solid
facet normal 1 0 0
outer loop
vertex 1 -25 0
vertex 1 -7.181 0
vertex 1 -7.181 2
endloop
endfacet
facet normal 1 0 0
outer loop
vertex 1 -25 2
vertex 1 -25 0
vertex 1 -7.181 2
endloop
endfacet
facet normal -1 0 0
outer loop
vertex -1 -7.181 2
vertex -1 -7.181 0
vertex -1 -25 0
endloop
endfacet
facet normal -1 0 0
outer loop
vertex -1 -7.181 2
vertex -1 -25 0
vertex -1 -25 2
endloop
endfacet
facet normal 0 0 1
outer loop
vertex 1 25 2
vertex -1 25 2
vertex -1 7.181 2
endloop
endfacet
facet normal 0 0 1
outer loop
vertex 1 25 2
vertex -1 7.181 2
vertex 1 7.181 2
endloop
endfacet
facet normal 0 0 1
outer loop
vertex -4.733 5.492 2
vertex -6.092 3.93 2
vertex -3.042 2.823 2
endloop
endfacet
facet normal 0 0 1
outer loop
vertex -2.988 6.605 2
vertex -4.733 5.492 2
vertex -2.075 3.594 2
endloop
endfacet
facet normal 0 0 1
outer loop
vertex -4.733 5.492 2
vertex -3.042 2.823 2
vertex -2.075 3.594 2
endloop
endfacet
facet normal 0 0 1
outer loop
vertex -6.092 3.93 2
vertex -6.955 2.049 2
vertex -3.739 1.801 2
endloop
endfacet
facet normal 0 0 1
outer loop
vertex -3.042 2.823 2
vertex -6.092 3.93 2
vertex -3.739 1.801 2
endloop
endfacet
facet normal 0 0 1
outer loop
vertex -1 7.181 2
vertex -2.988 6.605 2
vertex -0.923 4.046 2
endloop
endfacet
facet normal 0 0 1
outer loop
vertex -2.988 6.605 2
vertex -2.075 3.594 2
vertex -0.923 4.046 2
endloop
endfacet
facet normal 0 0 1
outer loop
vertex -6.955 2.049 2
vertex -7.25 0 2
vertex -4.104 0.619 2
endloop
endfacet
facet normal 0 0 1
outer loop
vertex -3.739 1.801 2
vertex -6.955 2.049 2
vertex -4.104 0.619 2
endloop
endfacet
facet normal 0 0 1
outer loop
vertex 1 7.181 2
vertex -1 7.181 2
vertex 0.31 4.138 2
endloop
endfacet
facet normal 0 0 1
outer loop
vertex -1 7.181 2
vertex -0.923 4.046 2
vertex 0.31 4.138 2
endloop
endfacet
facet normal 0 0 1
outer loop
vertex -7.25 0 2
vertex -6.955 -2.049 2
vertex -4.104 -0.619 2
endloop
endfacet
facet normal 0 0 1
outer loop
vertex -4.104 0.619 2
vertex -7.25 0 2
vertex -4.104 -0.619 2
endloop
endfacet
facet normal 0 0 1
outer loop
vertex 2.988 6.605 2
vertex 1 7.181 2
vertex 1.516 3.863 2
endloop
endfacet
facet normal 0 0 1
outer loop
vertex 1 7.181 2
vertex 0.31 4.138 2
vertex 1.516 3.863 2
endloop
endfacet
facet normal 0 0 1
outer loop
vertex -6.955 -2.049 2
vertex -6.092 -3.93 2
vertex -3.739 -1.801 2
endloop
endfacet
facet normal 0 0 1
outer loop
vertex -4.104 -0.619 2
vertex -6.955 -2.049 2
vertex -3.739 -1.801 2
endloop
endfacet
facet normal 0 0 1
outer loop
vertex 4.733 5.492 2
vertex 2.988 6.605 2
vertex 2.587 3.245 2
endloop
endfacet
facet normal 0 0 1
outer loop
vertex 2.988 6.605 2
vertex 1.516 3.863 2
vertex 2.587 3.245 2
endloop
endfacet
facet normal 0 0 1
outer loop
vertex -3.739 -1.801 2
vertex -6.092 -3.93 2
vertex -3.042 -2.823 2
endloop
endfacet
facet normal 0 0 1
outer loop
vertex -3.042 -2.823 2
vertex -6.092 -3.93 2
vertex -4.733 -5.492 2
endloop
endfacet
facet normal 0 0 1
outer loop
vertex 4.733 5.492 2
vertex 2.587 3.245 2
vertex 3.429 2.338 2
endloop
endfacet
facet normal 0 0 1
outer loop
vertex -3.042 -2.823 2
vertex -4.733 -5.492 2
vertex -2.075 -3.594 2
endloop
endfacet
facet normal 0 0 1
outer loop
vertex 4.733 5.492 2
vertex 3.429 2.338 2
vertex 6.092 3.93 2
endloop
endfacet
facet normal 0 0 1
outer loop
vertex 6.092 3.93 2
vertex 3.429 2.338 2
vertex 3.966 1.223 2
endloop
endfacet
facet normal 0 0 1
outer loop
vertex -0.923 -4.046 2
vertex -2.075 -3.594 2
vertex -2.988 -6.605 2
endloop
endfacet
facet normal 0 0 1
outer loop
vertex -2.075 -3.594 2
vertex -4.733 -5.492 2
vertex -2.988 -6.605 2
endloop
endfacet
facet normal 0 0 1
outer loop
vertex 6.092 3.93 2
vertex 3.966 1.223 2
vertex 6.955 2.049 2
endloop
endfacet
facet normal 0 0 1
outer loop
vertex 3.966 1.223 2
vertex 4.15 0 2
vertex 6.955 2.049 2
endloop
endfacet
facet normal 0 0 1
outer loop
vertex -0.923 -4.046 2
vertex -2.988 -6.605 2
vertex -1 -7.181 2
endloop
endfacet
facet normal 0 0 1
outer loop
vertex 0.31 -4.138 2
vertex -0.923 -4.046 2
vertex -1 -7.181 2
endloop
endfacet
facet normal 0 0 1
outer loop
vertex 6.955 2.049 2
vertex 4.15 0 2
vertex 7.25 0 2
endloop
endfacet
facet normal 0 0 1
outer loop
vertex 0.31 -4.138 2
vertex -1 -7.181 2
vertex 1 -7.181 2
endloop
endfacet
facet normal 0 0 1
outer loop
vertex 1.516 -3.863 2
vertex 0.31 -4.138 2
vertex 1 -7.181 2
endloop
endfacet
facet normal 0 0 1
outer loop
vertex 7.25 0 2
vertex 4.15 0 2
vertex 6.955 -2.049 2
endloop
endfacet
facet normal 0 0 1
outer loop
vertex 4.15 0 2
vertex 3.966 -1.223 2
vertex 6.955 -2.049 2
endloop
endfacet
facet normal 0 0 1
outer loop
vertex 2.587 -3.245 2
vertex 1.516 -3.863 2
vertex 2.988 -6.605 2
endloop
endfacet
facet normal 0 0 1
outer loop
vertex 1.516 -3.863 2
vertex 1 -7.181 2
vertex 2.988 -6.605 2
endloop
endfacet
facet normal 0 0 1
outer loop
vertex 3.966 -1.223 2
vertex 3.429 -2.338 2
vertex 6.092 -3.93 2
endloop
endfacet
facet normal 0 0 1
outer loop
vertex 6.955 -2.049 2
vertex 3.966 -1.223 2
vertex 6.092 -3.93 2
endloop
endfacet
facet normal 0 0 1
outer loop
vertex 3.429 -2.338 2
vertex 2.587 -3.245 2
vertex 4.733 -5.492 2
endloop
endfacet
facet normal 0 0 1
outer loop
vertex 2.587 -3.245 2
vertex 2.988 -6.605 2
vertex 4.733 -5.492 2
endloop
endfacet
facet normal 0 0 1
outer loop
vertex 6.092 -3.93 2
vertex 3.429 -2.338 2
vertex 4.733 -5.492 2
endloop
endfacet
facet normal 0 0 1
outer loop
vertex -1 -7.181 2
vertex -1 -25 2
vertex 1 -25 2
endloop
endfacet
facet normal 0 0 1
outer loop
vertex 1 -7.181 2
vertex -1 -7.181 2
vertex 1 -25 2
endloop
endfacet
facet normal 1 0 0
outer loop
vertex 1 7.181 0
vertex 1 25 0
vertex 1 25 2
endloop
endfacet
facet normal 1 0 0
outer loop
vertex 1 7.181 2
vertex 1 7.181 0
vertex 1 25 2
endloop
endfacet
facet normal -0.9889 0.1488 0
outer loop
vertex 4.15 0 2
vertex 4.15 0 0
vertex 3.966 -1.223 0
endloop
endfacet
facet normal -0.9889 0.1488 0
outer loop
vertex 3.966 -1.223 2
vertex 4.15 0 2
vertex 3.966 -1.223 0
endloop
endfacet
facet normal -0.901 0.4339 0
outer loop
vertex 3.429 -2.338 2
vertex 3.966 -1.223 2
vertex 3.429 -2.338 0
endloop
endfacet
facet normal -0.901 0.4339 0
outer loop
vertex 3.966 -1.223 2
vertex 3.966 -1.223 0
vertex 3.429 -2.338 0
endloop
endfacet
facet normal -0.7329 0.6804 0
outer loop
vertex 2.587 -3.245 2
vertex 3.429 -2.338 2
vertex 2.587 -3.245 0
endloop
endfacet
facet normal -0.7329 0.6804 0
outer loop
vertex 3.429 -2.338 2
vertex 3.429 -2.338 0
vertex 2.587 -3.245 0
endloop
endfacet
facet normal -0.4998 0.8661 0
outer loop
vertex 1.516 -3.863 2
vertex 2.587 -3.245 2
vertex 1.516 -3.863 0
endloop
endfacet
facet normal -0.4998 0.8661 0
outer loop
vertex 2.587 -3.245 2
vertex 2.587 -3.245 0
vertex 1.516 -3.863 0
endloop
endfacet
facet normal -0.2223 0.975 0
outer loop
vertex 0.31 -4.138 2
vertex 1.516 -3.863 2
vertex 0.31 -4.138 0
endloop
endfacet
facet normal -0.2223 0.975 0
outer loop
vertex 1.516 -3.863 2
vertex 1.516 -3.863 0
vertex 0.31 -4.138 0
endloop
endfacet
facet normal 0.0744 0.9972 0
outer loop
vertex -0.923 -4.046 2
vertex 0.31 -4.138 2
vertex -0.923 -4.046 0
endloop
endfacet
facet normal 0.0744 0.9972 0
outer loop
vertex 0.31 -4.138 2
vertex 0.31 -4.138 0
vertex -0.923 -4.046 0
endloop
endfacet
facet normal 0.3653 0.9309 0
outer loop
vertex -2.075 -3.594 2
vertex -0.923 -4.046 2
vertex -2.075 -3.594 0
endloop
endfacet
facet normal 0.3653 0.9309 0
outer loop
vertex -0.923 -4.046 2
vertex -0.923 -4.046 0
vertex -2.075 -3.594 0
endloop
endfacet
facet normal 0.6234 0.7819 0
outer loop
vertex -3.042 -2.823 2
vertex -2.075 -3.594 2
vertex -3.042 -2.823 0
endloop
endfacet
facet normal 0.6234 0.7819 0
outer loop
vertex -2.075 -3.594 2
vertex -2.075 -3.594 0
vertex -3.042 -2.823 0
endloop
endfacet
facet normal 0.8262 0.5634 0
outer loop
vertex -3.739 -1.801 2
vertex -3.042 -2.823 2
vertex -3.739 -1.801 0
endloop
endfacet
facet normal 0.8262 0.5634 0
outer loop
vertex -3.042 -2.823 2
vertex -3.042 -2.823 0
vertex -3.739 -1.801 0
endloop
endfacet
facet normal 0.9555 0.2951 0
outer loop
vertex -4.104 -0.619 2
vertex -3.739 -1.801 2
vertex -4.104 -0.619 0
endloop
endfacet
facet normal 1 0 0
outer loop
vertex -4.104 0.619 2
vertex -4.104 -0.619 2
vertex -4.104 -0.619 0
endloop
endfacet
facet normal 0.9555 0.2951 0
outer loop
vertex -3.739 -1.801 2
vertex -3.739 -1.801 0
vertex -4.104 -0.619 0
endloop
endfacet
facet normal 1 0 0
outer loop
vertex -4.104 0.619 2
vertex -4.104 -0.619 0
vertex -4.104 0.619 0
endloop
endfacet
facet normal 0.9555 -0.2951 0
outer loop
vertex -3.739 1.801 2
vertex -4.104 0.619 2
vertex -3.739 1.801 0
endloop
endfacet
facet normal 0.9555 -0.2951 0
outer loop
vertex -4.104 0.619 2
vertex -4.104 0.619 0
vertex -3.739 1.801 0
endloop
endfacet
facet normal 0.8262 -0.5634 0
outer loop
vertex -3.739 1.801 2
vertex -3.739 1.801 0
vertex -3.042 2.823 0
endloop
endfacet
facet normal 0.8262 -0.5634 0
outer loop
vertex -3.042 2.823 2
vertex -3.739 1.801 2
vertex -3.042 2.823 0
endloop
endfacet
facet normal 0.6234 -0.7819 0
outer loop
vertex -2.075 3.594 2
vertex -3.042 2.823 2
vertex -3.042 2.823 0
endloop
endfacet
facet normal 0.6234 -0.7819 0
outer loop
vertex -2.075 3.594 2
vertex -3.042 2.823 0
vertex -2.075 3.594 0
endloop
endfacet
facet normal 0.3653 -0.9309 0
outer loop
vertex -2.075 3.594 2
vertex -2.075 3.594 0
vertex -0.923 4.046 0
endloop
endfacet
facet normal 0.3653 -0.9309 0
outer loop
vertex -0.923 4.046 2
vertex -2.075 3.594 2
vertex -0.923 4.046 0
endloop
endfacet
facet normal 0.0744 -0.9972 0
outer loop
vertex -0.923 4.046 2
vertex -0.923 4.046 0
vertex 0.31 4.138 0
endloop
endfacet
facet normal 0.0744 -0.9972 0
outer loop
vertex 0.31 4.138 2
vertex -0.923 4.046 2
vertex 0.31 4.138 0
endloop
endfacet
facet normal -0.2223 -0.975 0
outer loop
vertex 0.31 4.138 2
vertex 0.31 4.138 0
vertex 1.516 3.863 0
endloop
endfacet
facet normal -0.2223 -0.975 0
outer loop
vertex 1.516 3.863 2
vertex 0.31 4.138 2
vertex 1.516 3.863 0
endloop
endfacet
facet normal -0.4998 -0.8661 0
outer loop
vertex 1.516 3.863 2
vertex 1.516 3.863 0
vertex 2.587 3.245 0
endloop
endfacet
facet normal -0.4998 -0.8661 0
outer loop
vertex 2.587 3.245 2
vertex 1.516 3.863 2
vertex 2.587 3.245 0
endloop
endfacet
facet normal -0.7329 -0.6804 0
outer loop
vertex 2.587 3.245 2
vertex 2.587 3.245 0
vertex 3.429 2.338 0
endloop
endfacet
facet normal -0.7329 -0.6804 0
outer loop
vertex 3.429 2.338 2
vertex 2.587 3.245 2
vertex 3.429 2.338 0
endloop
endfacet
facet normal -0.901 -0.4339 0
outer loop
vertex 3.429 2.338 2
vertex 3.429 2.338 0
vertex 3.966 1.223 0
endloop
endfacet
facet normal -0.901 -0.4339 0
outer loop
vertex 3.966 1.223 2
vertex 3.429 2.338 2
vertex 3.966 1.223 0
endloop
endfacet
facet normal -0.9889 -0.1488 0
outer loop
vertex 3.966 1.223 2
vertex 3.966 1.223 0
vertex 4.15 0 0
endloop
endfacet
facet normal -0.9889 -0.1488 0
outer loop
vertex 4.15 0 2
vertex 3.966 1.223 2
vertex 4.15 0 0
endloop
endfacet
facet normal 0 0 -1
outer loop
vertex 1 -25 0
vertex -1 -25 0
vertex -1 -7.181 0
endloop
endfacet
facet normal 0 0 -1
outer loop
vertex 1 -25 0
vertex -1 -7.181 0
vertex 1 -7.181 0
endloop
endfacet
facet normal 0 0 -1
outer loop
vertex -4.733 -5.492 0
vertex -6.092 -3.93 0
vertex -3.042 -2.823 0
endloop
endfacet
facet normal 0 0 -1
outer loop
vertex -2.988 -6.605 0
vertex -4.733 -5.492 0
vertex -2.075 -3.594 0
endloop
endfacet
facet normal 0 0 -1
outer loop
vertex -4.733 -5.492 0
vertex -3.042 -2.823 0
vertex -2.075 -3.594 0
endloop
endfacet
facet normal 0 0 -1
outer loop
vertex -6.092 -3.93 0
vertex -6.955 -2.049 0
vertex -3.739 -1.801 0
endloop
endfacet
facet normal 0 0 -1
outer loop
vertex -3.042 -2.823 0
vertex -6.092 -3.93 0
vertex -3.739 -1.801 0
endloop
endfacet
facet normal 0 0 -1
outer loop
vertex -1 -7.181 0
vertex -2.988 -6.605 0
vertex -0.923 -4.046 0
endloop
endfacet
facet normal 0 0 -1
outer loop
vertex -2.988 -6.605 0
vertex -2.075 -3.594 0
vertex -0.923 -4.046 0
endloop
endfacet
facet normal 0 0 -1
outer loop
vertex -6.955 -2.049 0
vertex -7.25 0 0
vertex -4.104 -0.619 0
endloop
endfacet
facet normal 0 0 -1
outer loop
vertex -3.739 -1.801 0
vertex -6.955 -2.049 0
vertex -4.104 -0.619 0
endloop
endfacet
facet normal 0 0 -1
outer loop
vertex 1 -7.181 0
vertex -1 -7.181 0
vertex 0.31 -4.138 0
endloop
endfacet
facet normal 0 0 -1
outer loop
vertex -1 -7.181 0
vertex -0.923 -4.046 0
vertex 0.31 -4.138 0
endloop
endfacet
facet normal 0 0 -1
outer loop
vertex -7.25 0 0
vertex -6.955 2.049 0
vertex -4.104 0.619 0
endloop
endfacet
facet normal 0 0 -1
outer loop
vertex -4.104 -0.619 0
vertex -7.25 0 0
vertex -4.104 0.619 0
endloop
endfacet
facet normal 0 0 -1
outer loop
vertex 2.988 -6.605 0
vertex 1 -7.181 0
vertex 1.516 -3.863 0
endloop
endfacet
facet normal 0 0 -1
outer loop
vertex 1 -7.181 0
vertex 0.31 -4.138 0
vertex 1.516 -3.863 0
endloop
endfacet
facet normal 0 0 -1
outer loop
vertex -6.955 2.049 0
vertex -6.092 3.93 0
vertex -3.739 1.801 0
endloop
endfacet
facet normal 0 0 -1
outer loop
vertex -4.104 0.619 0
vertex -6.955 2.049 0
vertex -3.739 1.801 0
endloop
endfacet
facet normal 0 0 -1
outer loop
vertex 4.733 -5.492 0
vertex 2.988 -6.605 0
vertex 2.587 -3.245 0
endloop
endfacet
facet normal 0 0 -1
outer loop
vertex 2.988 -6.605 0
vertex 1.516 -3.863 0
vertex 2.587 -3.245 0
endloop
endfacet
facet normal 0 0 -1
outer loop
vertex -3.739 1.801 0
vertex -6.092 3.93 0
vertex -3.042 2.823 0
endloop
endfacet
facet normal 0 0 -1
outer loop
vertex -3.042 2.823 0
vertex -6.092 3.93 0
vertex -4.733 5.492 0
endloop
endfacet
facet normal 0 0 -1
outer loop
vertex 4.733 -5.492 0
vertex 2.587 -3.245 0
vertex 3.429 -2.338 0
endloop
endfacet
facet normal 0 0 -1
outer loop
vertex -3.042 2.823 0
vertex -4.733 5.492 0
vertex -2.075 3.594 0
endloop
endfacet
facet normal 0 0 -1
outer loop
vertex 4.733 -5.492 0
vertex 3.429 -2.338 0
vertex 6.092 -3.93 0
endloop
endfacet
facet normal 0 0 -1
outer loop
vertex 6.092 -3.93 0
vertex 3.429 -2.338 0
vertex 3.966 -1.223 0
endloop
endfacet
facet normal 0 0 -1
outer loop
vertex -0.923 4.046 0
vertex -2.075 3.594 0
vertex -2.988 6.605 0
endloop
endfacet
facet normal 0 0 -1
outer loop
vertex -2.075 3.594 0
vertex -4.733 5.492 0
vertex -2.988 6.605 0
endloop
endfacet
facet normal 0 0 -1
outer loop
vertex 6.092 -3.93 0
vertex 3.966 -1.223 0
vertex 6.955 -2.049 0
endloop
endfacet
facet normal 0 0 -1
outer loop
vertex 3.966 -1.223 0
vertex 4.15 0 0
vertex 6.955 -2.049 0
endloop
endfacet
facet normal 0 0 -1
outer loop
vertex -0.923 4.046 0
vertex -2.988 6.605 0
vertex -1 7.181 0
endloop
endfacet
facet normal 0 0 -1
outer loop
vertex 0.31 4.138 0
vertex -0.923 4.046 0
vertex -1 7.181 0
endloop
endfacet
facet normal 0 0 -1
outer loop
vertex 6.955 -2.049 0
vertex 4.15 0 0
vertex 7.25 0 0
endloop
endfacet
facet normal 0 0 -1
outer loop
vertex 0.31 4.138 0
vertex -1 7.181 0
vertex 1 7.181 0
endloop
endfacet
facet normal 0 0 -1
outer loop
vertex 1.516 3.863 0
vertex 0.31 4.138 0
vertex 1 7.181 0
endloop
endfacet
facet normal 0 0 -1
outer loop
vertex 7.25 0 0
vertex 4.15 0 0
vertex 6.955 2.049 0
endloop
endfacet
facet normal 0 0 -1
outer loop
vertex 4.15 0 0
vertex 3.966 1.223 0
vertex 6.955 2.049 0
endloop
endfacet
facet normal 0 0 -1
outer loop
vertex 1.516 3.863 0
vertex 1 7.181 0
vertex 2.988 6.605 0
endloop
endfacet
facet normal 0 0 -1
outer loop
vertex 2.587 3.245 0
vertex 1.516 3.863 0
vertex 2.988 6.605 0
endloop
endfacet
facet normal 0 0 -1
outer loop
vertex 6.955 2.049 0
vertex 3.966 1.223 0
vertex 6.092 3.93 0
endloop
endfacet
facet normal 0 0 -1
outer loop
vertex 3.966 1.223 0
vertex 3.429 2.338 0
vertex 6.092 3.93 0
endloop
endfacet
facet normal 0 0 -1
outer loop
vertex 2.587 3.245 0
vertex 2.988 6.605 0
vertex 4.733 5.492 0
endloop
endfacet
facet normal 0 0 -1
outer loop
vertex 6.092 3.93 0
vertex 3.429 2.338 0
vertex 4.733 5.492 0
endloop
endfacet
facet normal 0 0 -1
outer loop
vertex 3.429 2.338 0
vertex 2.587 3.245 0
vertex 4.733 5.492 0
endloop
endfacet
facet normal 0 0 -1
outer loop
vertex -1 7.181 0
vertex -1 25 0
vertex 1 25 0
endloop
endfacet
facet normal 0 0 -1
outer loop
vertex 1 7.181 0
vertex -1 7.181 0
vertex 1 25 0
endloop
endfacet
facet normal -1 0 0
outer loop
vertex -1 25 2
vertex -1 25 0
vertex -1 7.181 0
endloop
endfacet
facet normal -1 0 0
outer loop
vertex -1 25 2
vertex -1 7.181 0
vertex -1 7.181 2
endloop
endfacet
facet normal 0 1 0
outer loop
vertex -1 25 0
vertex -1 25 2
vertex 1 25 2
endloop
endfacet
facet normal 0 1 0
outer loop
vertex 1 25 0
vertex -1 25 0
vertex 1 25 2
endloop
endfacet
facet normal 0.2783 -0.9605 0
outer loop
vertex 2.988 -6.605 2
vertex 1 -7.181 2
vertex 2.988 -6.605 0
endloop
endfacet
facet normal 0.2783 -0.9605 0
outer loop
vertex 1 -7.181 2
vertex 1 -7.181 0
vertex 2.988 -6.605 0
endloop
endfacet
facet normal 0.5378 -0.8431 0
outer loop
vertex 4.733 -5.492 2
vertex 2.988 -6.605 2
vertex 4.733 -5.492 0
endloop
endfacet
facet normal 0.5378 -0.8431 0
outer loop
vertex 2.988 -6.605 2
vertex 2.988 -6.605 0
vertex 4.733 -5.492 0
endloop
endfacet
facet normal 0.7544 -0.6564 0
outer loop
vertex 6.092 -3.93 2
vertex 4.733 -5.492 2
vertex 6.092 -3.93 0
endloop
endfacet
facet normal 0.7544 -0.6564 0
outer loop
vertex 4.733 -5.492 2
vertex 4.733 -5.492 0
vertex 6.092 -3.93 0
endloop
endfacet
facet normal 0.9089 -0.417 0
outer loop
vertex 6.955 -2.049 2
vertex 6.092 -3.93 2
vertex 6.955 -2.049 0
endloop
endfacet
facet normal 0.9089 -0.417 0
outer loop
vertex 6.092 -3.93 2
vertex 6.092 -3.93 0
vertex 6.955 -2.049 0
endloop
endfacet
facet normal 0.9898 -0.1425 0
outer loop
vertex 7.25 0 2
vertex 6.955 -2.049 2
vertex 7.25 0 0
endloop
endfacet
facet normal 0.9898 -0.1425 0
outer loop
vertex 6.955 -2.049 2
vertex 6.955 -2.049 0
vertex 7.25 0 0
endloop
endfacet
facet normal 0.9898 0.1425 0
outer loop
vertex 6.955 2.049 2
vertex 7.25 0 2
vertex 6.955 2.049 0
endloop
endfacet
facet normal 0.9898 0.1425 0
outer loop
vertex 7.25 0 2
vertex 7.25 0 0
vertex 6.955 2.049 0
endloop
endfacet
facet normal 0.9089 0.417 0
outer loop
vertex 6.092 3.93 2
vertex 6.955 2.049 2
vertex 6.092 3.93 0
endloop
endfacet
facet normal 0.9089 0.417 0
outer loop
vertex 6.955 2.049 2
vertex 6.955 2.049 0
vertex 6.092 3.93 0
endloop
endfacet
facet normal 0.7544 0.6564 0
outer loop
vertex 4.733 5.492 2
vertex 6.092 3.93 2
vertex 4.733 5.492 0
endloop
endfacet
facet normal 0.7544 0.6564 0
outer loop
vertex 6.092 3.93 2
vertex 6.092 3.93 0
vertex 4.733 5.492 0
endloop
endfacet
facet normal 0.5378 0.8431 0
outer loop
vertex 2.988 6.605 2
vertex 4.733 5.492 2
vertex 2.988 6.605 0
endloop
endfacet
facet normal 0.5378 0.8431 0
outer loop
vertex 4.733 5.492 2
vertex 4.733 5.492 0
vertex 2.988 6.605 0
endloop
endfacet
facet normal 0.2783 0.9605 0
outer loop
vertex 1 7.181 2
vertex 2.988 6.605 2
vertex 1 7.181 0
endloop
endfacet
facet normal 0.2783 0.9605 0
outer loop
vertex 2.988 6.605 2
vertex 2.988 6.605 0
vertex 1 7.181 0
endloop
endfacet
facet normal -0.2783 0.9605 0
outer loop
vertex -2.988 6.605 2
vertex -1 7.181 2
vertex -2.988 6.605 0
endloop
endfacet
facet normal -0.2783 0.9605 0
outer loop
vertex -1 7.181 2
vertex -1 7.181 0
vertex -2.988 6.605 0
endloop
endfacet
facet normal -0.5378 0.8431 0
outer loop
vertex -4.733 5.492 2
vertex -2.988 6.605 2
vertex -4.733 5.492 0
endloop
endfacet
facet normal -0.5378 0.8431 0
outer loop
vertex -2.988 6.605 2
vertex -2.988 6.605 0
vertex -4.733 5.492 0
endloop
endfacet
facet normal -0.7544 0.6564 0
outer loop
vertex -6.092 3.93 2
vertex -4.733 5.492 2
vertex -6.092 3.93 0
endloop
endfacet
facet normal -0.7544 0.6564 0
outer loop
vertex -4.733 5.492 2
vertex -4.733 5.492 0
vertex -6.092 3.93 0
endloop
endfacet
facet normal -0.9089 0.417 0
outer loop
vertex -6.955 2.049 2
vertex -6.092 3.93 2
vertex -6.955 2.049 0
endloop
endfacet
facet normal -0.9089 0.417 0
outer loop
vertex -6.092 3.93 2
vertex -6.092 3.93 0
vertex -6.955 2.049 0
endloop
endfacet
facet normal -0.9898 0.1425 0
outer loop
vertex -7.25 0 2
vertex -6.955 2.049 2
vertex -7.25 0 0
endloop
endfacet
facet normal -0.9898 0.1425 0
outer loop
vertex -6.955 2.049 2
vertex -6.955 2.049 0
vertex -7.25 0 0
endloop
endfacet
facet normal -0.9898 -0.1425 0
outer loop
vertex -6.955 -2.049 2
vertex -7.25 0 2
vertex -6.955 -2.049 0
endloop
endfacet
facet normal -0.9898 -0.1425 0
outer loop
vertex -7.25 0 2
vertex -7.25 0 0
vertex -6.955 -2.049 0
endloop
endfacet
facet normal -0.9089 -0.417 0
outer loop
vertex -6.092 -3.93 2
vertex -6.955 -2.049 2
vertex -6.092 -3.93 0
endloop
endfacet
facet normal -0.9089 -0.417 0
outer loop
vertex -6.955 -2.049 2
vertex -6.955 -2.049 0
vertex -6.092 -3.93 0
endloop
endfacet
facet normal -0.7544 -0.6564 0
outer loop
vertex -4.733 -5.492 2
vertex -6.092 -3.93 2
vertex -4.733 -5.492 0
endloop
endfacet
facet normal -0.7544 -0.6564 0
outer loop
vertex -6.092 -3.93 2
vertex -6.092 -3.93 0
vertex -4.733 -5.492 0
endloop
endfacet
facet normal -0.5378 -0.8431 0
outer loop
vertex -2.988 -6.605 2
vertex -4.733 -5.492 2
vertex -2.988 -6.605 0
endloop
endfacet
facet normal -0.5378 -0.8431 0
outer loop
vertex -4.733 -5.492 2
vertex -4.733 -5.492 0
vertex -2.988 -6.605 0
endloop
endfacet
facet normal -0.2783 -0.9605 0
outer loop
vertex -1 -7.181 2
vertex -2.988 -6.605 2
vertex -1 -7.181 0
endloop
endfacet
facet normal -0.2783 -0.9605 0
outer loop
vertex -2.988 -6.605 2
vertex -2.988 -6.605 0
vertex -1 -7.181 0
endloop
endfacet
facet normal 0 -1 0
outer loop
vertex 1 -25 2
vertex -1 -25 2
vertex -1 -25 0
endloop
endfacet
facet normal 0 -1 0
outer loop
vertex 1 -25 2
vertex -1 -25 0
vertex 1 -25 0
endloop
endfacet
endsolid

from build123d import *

# Parameters (mm, degrees)
F0_R          = 7.25
F1_DEPTH      = 2
F4_W          = 2
F4_H          = 2
F2_DEPTH      = 25
F2_DEPTH_BACK = 25
F3_R          = 4.15
F5_DEPTH      = 25


with BuildPart() as f1:
    # F0 (on Top) → F1 (new body)
    with BuildSketch(Plane.XY):
        Circle(F0_R)
    extrude(amount=F1_DEPTH)

    # F4 (on Front) → F2 (join, two sides)
    with BuildSketch(Plane.XZ) as f2_sk:
        with Locations((0, 1)):
            Rectangle(F4_W, F4_H)
    extrude(amount=F2_DEPTH)
    extrude(f2_sk.sketch, amount=-F2_DEPTH_BACK)

    # F3 (on face) → F5 (cut)
    with BuildSketch(Plane(origin=(0, 0, 0), x_dir=(1, 0, 0), z_dir=(0, 0, -1))):
        Circle(F3_R)
    extrude(amount=-F5_DEPTH, mode=Mode.SUBTRACT)


solid = f1.part
